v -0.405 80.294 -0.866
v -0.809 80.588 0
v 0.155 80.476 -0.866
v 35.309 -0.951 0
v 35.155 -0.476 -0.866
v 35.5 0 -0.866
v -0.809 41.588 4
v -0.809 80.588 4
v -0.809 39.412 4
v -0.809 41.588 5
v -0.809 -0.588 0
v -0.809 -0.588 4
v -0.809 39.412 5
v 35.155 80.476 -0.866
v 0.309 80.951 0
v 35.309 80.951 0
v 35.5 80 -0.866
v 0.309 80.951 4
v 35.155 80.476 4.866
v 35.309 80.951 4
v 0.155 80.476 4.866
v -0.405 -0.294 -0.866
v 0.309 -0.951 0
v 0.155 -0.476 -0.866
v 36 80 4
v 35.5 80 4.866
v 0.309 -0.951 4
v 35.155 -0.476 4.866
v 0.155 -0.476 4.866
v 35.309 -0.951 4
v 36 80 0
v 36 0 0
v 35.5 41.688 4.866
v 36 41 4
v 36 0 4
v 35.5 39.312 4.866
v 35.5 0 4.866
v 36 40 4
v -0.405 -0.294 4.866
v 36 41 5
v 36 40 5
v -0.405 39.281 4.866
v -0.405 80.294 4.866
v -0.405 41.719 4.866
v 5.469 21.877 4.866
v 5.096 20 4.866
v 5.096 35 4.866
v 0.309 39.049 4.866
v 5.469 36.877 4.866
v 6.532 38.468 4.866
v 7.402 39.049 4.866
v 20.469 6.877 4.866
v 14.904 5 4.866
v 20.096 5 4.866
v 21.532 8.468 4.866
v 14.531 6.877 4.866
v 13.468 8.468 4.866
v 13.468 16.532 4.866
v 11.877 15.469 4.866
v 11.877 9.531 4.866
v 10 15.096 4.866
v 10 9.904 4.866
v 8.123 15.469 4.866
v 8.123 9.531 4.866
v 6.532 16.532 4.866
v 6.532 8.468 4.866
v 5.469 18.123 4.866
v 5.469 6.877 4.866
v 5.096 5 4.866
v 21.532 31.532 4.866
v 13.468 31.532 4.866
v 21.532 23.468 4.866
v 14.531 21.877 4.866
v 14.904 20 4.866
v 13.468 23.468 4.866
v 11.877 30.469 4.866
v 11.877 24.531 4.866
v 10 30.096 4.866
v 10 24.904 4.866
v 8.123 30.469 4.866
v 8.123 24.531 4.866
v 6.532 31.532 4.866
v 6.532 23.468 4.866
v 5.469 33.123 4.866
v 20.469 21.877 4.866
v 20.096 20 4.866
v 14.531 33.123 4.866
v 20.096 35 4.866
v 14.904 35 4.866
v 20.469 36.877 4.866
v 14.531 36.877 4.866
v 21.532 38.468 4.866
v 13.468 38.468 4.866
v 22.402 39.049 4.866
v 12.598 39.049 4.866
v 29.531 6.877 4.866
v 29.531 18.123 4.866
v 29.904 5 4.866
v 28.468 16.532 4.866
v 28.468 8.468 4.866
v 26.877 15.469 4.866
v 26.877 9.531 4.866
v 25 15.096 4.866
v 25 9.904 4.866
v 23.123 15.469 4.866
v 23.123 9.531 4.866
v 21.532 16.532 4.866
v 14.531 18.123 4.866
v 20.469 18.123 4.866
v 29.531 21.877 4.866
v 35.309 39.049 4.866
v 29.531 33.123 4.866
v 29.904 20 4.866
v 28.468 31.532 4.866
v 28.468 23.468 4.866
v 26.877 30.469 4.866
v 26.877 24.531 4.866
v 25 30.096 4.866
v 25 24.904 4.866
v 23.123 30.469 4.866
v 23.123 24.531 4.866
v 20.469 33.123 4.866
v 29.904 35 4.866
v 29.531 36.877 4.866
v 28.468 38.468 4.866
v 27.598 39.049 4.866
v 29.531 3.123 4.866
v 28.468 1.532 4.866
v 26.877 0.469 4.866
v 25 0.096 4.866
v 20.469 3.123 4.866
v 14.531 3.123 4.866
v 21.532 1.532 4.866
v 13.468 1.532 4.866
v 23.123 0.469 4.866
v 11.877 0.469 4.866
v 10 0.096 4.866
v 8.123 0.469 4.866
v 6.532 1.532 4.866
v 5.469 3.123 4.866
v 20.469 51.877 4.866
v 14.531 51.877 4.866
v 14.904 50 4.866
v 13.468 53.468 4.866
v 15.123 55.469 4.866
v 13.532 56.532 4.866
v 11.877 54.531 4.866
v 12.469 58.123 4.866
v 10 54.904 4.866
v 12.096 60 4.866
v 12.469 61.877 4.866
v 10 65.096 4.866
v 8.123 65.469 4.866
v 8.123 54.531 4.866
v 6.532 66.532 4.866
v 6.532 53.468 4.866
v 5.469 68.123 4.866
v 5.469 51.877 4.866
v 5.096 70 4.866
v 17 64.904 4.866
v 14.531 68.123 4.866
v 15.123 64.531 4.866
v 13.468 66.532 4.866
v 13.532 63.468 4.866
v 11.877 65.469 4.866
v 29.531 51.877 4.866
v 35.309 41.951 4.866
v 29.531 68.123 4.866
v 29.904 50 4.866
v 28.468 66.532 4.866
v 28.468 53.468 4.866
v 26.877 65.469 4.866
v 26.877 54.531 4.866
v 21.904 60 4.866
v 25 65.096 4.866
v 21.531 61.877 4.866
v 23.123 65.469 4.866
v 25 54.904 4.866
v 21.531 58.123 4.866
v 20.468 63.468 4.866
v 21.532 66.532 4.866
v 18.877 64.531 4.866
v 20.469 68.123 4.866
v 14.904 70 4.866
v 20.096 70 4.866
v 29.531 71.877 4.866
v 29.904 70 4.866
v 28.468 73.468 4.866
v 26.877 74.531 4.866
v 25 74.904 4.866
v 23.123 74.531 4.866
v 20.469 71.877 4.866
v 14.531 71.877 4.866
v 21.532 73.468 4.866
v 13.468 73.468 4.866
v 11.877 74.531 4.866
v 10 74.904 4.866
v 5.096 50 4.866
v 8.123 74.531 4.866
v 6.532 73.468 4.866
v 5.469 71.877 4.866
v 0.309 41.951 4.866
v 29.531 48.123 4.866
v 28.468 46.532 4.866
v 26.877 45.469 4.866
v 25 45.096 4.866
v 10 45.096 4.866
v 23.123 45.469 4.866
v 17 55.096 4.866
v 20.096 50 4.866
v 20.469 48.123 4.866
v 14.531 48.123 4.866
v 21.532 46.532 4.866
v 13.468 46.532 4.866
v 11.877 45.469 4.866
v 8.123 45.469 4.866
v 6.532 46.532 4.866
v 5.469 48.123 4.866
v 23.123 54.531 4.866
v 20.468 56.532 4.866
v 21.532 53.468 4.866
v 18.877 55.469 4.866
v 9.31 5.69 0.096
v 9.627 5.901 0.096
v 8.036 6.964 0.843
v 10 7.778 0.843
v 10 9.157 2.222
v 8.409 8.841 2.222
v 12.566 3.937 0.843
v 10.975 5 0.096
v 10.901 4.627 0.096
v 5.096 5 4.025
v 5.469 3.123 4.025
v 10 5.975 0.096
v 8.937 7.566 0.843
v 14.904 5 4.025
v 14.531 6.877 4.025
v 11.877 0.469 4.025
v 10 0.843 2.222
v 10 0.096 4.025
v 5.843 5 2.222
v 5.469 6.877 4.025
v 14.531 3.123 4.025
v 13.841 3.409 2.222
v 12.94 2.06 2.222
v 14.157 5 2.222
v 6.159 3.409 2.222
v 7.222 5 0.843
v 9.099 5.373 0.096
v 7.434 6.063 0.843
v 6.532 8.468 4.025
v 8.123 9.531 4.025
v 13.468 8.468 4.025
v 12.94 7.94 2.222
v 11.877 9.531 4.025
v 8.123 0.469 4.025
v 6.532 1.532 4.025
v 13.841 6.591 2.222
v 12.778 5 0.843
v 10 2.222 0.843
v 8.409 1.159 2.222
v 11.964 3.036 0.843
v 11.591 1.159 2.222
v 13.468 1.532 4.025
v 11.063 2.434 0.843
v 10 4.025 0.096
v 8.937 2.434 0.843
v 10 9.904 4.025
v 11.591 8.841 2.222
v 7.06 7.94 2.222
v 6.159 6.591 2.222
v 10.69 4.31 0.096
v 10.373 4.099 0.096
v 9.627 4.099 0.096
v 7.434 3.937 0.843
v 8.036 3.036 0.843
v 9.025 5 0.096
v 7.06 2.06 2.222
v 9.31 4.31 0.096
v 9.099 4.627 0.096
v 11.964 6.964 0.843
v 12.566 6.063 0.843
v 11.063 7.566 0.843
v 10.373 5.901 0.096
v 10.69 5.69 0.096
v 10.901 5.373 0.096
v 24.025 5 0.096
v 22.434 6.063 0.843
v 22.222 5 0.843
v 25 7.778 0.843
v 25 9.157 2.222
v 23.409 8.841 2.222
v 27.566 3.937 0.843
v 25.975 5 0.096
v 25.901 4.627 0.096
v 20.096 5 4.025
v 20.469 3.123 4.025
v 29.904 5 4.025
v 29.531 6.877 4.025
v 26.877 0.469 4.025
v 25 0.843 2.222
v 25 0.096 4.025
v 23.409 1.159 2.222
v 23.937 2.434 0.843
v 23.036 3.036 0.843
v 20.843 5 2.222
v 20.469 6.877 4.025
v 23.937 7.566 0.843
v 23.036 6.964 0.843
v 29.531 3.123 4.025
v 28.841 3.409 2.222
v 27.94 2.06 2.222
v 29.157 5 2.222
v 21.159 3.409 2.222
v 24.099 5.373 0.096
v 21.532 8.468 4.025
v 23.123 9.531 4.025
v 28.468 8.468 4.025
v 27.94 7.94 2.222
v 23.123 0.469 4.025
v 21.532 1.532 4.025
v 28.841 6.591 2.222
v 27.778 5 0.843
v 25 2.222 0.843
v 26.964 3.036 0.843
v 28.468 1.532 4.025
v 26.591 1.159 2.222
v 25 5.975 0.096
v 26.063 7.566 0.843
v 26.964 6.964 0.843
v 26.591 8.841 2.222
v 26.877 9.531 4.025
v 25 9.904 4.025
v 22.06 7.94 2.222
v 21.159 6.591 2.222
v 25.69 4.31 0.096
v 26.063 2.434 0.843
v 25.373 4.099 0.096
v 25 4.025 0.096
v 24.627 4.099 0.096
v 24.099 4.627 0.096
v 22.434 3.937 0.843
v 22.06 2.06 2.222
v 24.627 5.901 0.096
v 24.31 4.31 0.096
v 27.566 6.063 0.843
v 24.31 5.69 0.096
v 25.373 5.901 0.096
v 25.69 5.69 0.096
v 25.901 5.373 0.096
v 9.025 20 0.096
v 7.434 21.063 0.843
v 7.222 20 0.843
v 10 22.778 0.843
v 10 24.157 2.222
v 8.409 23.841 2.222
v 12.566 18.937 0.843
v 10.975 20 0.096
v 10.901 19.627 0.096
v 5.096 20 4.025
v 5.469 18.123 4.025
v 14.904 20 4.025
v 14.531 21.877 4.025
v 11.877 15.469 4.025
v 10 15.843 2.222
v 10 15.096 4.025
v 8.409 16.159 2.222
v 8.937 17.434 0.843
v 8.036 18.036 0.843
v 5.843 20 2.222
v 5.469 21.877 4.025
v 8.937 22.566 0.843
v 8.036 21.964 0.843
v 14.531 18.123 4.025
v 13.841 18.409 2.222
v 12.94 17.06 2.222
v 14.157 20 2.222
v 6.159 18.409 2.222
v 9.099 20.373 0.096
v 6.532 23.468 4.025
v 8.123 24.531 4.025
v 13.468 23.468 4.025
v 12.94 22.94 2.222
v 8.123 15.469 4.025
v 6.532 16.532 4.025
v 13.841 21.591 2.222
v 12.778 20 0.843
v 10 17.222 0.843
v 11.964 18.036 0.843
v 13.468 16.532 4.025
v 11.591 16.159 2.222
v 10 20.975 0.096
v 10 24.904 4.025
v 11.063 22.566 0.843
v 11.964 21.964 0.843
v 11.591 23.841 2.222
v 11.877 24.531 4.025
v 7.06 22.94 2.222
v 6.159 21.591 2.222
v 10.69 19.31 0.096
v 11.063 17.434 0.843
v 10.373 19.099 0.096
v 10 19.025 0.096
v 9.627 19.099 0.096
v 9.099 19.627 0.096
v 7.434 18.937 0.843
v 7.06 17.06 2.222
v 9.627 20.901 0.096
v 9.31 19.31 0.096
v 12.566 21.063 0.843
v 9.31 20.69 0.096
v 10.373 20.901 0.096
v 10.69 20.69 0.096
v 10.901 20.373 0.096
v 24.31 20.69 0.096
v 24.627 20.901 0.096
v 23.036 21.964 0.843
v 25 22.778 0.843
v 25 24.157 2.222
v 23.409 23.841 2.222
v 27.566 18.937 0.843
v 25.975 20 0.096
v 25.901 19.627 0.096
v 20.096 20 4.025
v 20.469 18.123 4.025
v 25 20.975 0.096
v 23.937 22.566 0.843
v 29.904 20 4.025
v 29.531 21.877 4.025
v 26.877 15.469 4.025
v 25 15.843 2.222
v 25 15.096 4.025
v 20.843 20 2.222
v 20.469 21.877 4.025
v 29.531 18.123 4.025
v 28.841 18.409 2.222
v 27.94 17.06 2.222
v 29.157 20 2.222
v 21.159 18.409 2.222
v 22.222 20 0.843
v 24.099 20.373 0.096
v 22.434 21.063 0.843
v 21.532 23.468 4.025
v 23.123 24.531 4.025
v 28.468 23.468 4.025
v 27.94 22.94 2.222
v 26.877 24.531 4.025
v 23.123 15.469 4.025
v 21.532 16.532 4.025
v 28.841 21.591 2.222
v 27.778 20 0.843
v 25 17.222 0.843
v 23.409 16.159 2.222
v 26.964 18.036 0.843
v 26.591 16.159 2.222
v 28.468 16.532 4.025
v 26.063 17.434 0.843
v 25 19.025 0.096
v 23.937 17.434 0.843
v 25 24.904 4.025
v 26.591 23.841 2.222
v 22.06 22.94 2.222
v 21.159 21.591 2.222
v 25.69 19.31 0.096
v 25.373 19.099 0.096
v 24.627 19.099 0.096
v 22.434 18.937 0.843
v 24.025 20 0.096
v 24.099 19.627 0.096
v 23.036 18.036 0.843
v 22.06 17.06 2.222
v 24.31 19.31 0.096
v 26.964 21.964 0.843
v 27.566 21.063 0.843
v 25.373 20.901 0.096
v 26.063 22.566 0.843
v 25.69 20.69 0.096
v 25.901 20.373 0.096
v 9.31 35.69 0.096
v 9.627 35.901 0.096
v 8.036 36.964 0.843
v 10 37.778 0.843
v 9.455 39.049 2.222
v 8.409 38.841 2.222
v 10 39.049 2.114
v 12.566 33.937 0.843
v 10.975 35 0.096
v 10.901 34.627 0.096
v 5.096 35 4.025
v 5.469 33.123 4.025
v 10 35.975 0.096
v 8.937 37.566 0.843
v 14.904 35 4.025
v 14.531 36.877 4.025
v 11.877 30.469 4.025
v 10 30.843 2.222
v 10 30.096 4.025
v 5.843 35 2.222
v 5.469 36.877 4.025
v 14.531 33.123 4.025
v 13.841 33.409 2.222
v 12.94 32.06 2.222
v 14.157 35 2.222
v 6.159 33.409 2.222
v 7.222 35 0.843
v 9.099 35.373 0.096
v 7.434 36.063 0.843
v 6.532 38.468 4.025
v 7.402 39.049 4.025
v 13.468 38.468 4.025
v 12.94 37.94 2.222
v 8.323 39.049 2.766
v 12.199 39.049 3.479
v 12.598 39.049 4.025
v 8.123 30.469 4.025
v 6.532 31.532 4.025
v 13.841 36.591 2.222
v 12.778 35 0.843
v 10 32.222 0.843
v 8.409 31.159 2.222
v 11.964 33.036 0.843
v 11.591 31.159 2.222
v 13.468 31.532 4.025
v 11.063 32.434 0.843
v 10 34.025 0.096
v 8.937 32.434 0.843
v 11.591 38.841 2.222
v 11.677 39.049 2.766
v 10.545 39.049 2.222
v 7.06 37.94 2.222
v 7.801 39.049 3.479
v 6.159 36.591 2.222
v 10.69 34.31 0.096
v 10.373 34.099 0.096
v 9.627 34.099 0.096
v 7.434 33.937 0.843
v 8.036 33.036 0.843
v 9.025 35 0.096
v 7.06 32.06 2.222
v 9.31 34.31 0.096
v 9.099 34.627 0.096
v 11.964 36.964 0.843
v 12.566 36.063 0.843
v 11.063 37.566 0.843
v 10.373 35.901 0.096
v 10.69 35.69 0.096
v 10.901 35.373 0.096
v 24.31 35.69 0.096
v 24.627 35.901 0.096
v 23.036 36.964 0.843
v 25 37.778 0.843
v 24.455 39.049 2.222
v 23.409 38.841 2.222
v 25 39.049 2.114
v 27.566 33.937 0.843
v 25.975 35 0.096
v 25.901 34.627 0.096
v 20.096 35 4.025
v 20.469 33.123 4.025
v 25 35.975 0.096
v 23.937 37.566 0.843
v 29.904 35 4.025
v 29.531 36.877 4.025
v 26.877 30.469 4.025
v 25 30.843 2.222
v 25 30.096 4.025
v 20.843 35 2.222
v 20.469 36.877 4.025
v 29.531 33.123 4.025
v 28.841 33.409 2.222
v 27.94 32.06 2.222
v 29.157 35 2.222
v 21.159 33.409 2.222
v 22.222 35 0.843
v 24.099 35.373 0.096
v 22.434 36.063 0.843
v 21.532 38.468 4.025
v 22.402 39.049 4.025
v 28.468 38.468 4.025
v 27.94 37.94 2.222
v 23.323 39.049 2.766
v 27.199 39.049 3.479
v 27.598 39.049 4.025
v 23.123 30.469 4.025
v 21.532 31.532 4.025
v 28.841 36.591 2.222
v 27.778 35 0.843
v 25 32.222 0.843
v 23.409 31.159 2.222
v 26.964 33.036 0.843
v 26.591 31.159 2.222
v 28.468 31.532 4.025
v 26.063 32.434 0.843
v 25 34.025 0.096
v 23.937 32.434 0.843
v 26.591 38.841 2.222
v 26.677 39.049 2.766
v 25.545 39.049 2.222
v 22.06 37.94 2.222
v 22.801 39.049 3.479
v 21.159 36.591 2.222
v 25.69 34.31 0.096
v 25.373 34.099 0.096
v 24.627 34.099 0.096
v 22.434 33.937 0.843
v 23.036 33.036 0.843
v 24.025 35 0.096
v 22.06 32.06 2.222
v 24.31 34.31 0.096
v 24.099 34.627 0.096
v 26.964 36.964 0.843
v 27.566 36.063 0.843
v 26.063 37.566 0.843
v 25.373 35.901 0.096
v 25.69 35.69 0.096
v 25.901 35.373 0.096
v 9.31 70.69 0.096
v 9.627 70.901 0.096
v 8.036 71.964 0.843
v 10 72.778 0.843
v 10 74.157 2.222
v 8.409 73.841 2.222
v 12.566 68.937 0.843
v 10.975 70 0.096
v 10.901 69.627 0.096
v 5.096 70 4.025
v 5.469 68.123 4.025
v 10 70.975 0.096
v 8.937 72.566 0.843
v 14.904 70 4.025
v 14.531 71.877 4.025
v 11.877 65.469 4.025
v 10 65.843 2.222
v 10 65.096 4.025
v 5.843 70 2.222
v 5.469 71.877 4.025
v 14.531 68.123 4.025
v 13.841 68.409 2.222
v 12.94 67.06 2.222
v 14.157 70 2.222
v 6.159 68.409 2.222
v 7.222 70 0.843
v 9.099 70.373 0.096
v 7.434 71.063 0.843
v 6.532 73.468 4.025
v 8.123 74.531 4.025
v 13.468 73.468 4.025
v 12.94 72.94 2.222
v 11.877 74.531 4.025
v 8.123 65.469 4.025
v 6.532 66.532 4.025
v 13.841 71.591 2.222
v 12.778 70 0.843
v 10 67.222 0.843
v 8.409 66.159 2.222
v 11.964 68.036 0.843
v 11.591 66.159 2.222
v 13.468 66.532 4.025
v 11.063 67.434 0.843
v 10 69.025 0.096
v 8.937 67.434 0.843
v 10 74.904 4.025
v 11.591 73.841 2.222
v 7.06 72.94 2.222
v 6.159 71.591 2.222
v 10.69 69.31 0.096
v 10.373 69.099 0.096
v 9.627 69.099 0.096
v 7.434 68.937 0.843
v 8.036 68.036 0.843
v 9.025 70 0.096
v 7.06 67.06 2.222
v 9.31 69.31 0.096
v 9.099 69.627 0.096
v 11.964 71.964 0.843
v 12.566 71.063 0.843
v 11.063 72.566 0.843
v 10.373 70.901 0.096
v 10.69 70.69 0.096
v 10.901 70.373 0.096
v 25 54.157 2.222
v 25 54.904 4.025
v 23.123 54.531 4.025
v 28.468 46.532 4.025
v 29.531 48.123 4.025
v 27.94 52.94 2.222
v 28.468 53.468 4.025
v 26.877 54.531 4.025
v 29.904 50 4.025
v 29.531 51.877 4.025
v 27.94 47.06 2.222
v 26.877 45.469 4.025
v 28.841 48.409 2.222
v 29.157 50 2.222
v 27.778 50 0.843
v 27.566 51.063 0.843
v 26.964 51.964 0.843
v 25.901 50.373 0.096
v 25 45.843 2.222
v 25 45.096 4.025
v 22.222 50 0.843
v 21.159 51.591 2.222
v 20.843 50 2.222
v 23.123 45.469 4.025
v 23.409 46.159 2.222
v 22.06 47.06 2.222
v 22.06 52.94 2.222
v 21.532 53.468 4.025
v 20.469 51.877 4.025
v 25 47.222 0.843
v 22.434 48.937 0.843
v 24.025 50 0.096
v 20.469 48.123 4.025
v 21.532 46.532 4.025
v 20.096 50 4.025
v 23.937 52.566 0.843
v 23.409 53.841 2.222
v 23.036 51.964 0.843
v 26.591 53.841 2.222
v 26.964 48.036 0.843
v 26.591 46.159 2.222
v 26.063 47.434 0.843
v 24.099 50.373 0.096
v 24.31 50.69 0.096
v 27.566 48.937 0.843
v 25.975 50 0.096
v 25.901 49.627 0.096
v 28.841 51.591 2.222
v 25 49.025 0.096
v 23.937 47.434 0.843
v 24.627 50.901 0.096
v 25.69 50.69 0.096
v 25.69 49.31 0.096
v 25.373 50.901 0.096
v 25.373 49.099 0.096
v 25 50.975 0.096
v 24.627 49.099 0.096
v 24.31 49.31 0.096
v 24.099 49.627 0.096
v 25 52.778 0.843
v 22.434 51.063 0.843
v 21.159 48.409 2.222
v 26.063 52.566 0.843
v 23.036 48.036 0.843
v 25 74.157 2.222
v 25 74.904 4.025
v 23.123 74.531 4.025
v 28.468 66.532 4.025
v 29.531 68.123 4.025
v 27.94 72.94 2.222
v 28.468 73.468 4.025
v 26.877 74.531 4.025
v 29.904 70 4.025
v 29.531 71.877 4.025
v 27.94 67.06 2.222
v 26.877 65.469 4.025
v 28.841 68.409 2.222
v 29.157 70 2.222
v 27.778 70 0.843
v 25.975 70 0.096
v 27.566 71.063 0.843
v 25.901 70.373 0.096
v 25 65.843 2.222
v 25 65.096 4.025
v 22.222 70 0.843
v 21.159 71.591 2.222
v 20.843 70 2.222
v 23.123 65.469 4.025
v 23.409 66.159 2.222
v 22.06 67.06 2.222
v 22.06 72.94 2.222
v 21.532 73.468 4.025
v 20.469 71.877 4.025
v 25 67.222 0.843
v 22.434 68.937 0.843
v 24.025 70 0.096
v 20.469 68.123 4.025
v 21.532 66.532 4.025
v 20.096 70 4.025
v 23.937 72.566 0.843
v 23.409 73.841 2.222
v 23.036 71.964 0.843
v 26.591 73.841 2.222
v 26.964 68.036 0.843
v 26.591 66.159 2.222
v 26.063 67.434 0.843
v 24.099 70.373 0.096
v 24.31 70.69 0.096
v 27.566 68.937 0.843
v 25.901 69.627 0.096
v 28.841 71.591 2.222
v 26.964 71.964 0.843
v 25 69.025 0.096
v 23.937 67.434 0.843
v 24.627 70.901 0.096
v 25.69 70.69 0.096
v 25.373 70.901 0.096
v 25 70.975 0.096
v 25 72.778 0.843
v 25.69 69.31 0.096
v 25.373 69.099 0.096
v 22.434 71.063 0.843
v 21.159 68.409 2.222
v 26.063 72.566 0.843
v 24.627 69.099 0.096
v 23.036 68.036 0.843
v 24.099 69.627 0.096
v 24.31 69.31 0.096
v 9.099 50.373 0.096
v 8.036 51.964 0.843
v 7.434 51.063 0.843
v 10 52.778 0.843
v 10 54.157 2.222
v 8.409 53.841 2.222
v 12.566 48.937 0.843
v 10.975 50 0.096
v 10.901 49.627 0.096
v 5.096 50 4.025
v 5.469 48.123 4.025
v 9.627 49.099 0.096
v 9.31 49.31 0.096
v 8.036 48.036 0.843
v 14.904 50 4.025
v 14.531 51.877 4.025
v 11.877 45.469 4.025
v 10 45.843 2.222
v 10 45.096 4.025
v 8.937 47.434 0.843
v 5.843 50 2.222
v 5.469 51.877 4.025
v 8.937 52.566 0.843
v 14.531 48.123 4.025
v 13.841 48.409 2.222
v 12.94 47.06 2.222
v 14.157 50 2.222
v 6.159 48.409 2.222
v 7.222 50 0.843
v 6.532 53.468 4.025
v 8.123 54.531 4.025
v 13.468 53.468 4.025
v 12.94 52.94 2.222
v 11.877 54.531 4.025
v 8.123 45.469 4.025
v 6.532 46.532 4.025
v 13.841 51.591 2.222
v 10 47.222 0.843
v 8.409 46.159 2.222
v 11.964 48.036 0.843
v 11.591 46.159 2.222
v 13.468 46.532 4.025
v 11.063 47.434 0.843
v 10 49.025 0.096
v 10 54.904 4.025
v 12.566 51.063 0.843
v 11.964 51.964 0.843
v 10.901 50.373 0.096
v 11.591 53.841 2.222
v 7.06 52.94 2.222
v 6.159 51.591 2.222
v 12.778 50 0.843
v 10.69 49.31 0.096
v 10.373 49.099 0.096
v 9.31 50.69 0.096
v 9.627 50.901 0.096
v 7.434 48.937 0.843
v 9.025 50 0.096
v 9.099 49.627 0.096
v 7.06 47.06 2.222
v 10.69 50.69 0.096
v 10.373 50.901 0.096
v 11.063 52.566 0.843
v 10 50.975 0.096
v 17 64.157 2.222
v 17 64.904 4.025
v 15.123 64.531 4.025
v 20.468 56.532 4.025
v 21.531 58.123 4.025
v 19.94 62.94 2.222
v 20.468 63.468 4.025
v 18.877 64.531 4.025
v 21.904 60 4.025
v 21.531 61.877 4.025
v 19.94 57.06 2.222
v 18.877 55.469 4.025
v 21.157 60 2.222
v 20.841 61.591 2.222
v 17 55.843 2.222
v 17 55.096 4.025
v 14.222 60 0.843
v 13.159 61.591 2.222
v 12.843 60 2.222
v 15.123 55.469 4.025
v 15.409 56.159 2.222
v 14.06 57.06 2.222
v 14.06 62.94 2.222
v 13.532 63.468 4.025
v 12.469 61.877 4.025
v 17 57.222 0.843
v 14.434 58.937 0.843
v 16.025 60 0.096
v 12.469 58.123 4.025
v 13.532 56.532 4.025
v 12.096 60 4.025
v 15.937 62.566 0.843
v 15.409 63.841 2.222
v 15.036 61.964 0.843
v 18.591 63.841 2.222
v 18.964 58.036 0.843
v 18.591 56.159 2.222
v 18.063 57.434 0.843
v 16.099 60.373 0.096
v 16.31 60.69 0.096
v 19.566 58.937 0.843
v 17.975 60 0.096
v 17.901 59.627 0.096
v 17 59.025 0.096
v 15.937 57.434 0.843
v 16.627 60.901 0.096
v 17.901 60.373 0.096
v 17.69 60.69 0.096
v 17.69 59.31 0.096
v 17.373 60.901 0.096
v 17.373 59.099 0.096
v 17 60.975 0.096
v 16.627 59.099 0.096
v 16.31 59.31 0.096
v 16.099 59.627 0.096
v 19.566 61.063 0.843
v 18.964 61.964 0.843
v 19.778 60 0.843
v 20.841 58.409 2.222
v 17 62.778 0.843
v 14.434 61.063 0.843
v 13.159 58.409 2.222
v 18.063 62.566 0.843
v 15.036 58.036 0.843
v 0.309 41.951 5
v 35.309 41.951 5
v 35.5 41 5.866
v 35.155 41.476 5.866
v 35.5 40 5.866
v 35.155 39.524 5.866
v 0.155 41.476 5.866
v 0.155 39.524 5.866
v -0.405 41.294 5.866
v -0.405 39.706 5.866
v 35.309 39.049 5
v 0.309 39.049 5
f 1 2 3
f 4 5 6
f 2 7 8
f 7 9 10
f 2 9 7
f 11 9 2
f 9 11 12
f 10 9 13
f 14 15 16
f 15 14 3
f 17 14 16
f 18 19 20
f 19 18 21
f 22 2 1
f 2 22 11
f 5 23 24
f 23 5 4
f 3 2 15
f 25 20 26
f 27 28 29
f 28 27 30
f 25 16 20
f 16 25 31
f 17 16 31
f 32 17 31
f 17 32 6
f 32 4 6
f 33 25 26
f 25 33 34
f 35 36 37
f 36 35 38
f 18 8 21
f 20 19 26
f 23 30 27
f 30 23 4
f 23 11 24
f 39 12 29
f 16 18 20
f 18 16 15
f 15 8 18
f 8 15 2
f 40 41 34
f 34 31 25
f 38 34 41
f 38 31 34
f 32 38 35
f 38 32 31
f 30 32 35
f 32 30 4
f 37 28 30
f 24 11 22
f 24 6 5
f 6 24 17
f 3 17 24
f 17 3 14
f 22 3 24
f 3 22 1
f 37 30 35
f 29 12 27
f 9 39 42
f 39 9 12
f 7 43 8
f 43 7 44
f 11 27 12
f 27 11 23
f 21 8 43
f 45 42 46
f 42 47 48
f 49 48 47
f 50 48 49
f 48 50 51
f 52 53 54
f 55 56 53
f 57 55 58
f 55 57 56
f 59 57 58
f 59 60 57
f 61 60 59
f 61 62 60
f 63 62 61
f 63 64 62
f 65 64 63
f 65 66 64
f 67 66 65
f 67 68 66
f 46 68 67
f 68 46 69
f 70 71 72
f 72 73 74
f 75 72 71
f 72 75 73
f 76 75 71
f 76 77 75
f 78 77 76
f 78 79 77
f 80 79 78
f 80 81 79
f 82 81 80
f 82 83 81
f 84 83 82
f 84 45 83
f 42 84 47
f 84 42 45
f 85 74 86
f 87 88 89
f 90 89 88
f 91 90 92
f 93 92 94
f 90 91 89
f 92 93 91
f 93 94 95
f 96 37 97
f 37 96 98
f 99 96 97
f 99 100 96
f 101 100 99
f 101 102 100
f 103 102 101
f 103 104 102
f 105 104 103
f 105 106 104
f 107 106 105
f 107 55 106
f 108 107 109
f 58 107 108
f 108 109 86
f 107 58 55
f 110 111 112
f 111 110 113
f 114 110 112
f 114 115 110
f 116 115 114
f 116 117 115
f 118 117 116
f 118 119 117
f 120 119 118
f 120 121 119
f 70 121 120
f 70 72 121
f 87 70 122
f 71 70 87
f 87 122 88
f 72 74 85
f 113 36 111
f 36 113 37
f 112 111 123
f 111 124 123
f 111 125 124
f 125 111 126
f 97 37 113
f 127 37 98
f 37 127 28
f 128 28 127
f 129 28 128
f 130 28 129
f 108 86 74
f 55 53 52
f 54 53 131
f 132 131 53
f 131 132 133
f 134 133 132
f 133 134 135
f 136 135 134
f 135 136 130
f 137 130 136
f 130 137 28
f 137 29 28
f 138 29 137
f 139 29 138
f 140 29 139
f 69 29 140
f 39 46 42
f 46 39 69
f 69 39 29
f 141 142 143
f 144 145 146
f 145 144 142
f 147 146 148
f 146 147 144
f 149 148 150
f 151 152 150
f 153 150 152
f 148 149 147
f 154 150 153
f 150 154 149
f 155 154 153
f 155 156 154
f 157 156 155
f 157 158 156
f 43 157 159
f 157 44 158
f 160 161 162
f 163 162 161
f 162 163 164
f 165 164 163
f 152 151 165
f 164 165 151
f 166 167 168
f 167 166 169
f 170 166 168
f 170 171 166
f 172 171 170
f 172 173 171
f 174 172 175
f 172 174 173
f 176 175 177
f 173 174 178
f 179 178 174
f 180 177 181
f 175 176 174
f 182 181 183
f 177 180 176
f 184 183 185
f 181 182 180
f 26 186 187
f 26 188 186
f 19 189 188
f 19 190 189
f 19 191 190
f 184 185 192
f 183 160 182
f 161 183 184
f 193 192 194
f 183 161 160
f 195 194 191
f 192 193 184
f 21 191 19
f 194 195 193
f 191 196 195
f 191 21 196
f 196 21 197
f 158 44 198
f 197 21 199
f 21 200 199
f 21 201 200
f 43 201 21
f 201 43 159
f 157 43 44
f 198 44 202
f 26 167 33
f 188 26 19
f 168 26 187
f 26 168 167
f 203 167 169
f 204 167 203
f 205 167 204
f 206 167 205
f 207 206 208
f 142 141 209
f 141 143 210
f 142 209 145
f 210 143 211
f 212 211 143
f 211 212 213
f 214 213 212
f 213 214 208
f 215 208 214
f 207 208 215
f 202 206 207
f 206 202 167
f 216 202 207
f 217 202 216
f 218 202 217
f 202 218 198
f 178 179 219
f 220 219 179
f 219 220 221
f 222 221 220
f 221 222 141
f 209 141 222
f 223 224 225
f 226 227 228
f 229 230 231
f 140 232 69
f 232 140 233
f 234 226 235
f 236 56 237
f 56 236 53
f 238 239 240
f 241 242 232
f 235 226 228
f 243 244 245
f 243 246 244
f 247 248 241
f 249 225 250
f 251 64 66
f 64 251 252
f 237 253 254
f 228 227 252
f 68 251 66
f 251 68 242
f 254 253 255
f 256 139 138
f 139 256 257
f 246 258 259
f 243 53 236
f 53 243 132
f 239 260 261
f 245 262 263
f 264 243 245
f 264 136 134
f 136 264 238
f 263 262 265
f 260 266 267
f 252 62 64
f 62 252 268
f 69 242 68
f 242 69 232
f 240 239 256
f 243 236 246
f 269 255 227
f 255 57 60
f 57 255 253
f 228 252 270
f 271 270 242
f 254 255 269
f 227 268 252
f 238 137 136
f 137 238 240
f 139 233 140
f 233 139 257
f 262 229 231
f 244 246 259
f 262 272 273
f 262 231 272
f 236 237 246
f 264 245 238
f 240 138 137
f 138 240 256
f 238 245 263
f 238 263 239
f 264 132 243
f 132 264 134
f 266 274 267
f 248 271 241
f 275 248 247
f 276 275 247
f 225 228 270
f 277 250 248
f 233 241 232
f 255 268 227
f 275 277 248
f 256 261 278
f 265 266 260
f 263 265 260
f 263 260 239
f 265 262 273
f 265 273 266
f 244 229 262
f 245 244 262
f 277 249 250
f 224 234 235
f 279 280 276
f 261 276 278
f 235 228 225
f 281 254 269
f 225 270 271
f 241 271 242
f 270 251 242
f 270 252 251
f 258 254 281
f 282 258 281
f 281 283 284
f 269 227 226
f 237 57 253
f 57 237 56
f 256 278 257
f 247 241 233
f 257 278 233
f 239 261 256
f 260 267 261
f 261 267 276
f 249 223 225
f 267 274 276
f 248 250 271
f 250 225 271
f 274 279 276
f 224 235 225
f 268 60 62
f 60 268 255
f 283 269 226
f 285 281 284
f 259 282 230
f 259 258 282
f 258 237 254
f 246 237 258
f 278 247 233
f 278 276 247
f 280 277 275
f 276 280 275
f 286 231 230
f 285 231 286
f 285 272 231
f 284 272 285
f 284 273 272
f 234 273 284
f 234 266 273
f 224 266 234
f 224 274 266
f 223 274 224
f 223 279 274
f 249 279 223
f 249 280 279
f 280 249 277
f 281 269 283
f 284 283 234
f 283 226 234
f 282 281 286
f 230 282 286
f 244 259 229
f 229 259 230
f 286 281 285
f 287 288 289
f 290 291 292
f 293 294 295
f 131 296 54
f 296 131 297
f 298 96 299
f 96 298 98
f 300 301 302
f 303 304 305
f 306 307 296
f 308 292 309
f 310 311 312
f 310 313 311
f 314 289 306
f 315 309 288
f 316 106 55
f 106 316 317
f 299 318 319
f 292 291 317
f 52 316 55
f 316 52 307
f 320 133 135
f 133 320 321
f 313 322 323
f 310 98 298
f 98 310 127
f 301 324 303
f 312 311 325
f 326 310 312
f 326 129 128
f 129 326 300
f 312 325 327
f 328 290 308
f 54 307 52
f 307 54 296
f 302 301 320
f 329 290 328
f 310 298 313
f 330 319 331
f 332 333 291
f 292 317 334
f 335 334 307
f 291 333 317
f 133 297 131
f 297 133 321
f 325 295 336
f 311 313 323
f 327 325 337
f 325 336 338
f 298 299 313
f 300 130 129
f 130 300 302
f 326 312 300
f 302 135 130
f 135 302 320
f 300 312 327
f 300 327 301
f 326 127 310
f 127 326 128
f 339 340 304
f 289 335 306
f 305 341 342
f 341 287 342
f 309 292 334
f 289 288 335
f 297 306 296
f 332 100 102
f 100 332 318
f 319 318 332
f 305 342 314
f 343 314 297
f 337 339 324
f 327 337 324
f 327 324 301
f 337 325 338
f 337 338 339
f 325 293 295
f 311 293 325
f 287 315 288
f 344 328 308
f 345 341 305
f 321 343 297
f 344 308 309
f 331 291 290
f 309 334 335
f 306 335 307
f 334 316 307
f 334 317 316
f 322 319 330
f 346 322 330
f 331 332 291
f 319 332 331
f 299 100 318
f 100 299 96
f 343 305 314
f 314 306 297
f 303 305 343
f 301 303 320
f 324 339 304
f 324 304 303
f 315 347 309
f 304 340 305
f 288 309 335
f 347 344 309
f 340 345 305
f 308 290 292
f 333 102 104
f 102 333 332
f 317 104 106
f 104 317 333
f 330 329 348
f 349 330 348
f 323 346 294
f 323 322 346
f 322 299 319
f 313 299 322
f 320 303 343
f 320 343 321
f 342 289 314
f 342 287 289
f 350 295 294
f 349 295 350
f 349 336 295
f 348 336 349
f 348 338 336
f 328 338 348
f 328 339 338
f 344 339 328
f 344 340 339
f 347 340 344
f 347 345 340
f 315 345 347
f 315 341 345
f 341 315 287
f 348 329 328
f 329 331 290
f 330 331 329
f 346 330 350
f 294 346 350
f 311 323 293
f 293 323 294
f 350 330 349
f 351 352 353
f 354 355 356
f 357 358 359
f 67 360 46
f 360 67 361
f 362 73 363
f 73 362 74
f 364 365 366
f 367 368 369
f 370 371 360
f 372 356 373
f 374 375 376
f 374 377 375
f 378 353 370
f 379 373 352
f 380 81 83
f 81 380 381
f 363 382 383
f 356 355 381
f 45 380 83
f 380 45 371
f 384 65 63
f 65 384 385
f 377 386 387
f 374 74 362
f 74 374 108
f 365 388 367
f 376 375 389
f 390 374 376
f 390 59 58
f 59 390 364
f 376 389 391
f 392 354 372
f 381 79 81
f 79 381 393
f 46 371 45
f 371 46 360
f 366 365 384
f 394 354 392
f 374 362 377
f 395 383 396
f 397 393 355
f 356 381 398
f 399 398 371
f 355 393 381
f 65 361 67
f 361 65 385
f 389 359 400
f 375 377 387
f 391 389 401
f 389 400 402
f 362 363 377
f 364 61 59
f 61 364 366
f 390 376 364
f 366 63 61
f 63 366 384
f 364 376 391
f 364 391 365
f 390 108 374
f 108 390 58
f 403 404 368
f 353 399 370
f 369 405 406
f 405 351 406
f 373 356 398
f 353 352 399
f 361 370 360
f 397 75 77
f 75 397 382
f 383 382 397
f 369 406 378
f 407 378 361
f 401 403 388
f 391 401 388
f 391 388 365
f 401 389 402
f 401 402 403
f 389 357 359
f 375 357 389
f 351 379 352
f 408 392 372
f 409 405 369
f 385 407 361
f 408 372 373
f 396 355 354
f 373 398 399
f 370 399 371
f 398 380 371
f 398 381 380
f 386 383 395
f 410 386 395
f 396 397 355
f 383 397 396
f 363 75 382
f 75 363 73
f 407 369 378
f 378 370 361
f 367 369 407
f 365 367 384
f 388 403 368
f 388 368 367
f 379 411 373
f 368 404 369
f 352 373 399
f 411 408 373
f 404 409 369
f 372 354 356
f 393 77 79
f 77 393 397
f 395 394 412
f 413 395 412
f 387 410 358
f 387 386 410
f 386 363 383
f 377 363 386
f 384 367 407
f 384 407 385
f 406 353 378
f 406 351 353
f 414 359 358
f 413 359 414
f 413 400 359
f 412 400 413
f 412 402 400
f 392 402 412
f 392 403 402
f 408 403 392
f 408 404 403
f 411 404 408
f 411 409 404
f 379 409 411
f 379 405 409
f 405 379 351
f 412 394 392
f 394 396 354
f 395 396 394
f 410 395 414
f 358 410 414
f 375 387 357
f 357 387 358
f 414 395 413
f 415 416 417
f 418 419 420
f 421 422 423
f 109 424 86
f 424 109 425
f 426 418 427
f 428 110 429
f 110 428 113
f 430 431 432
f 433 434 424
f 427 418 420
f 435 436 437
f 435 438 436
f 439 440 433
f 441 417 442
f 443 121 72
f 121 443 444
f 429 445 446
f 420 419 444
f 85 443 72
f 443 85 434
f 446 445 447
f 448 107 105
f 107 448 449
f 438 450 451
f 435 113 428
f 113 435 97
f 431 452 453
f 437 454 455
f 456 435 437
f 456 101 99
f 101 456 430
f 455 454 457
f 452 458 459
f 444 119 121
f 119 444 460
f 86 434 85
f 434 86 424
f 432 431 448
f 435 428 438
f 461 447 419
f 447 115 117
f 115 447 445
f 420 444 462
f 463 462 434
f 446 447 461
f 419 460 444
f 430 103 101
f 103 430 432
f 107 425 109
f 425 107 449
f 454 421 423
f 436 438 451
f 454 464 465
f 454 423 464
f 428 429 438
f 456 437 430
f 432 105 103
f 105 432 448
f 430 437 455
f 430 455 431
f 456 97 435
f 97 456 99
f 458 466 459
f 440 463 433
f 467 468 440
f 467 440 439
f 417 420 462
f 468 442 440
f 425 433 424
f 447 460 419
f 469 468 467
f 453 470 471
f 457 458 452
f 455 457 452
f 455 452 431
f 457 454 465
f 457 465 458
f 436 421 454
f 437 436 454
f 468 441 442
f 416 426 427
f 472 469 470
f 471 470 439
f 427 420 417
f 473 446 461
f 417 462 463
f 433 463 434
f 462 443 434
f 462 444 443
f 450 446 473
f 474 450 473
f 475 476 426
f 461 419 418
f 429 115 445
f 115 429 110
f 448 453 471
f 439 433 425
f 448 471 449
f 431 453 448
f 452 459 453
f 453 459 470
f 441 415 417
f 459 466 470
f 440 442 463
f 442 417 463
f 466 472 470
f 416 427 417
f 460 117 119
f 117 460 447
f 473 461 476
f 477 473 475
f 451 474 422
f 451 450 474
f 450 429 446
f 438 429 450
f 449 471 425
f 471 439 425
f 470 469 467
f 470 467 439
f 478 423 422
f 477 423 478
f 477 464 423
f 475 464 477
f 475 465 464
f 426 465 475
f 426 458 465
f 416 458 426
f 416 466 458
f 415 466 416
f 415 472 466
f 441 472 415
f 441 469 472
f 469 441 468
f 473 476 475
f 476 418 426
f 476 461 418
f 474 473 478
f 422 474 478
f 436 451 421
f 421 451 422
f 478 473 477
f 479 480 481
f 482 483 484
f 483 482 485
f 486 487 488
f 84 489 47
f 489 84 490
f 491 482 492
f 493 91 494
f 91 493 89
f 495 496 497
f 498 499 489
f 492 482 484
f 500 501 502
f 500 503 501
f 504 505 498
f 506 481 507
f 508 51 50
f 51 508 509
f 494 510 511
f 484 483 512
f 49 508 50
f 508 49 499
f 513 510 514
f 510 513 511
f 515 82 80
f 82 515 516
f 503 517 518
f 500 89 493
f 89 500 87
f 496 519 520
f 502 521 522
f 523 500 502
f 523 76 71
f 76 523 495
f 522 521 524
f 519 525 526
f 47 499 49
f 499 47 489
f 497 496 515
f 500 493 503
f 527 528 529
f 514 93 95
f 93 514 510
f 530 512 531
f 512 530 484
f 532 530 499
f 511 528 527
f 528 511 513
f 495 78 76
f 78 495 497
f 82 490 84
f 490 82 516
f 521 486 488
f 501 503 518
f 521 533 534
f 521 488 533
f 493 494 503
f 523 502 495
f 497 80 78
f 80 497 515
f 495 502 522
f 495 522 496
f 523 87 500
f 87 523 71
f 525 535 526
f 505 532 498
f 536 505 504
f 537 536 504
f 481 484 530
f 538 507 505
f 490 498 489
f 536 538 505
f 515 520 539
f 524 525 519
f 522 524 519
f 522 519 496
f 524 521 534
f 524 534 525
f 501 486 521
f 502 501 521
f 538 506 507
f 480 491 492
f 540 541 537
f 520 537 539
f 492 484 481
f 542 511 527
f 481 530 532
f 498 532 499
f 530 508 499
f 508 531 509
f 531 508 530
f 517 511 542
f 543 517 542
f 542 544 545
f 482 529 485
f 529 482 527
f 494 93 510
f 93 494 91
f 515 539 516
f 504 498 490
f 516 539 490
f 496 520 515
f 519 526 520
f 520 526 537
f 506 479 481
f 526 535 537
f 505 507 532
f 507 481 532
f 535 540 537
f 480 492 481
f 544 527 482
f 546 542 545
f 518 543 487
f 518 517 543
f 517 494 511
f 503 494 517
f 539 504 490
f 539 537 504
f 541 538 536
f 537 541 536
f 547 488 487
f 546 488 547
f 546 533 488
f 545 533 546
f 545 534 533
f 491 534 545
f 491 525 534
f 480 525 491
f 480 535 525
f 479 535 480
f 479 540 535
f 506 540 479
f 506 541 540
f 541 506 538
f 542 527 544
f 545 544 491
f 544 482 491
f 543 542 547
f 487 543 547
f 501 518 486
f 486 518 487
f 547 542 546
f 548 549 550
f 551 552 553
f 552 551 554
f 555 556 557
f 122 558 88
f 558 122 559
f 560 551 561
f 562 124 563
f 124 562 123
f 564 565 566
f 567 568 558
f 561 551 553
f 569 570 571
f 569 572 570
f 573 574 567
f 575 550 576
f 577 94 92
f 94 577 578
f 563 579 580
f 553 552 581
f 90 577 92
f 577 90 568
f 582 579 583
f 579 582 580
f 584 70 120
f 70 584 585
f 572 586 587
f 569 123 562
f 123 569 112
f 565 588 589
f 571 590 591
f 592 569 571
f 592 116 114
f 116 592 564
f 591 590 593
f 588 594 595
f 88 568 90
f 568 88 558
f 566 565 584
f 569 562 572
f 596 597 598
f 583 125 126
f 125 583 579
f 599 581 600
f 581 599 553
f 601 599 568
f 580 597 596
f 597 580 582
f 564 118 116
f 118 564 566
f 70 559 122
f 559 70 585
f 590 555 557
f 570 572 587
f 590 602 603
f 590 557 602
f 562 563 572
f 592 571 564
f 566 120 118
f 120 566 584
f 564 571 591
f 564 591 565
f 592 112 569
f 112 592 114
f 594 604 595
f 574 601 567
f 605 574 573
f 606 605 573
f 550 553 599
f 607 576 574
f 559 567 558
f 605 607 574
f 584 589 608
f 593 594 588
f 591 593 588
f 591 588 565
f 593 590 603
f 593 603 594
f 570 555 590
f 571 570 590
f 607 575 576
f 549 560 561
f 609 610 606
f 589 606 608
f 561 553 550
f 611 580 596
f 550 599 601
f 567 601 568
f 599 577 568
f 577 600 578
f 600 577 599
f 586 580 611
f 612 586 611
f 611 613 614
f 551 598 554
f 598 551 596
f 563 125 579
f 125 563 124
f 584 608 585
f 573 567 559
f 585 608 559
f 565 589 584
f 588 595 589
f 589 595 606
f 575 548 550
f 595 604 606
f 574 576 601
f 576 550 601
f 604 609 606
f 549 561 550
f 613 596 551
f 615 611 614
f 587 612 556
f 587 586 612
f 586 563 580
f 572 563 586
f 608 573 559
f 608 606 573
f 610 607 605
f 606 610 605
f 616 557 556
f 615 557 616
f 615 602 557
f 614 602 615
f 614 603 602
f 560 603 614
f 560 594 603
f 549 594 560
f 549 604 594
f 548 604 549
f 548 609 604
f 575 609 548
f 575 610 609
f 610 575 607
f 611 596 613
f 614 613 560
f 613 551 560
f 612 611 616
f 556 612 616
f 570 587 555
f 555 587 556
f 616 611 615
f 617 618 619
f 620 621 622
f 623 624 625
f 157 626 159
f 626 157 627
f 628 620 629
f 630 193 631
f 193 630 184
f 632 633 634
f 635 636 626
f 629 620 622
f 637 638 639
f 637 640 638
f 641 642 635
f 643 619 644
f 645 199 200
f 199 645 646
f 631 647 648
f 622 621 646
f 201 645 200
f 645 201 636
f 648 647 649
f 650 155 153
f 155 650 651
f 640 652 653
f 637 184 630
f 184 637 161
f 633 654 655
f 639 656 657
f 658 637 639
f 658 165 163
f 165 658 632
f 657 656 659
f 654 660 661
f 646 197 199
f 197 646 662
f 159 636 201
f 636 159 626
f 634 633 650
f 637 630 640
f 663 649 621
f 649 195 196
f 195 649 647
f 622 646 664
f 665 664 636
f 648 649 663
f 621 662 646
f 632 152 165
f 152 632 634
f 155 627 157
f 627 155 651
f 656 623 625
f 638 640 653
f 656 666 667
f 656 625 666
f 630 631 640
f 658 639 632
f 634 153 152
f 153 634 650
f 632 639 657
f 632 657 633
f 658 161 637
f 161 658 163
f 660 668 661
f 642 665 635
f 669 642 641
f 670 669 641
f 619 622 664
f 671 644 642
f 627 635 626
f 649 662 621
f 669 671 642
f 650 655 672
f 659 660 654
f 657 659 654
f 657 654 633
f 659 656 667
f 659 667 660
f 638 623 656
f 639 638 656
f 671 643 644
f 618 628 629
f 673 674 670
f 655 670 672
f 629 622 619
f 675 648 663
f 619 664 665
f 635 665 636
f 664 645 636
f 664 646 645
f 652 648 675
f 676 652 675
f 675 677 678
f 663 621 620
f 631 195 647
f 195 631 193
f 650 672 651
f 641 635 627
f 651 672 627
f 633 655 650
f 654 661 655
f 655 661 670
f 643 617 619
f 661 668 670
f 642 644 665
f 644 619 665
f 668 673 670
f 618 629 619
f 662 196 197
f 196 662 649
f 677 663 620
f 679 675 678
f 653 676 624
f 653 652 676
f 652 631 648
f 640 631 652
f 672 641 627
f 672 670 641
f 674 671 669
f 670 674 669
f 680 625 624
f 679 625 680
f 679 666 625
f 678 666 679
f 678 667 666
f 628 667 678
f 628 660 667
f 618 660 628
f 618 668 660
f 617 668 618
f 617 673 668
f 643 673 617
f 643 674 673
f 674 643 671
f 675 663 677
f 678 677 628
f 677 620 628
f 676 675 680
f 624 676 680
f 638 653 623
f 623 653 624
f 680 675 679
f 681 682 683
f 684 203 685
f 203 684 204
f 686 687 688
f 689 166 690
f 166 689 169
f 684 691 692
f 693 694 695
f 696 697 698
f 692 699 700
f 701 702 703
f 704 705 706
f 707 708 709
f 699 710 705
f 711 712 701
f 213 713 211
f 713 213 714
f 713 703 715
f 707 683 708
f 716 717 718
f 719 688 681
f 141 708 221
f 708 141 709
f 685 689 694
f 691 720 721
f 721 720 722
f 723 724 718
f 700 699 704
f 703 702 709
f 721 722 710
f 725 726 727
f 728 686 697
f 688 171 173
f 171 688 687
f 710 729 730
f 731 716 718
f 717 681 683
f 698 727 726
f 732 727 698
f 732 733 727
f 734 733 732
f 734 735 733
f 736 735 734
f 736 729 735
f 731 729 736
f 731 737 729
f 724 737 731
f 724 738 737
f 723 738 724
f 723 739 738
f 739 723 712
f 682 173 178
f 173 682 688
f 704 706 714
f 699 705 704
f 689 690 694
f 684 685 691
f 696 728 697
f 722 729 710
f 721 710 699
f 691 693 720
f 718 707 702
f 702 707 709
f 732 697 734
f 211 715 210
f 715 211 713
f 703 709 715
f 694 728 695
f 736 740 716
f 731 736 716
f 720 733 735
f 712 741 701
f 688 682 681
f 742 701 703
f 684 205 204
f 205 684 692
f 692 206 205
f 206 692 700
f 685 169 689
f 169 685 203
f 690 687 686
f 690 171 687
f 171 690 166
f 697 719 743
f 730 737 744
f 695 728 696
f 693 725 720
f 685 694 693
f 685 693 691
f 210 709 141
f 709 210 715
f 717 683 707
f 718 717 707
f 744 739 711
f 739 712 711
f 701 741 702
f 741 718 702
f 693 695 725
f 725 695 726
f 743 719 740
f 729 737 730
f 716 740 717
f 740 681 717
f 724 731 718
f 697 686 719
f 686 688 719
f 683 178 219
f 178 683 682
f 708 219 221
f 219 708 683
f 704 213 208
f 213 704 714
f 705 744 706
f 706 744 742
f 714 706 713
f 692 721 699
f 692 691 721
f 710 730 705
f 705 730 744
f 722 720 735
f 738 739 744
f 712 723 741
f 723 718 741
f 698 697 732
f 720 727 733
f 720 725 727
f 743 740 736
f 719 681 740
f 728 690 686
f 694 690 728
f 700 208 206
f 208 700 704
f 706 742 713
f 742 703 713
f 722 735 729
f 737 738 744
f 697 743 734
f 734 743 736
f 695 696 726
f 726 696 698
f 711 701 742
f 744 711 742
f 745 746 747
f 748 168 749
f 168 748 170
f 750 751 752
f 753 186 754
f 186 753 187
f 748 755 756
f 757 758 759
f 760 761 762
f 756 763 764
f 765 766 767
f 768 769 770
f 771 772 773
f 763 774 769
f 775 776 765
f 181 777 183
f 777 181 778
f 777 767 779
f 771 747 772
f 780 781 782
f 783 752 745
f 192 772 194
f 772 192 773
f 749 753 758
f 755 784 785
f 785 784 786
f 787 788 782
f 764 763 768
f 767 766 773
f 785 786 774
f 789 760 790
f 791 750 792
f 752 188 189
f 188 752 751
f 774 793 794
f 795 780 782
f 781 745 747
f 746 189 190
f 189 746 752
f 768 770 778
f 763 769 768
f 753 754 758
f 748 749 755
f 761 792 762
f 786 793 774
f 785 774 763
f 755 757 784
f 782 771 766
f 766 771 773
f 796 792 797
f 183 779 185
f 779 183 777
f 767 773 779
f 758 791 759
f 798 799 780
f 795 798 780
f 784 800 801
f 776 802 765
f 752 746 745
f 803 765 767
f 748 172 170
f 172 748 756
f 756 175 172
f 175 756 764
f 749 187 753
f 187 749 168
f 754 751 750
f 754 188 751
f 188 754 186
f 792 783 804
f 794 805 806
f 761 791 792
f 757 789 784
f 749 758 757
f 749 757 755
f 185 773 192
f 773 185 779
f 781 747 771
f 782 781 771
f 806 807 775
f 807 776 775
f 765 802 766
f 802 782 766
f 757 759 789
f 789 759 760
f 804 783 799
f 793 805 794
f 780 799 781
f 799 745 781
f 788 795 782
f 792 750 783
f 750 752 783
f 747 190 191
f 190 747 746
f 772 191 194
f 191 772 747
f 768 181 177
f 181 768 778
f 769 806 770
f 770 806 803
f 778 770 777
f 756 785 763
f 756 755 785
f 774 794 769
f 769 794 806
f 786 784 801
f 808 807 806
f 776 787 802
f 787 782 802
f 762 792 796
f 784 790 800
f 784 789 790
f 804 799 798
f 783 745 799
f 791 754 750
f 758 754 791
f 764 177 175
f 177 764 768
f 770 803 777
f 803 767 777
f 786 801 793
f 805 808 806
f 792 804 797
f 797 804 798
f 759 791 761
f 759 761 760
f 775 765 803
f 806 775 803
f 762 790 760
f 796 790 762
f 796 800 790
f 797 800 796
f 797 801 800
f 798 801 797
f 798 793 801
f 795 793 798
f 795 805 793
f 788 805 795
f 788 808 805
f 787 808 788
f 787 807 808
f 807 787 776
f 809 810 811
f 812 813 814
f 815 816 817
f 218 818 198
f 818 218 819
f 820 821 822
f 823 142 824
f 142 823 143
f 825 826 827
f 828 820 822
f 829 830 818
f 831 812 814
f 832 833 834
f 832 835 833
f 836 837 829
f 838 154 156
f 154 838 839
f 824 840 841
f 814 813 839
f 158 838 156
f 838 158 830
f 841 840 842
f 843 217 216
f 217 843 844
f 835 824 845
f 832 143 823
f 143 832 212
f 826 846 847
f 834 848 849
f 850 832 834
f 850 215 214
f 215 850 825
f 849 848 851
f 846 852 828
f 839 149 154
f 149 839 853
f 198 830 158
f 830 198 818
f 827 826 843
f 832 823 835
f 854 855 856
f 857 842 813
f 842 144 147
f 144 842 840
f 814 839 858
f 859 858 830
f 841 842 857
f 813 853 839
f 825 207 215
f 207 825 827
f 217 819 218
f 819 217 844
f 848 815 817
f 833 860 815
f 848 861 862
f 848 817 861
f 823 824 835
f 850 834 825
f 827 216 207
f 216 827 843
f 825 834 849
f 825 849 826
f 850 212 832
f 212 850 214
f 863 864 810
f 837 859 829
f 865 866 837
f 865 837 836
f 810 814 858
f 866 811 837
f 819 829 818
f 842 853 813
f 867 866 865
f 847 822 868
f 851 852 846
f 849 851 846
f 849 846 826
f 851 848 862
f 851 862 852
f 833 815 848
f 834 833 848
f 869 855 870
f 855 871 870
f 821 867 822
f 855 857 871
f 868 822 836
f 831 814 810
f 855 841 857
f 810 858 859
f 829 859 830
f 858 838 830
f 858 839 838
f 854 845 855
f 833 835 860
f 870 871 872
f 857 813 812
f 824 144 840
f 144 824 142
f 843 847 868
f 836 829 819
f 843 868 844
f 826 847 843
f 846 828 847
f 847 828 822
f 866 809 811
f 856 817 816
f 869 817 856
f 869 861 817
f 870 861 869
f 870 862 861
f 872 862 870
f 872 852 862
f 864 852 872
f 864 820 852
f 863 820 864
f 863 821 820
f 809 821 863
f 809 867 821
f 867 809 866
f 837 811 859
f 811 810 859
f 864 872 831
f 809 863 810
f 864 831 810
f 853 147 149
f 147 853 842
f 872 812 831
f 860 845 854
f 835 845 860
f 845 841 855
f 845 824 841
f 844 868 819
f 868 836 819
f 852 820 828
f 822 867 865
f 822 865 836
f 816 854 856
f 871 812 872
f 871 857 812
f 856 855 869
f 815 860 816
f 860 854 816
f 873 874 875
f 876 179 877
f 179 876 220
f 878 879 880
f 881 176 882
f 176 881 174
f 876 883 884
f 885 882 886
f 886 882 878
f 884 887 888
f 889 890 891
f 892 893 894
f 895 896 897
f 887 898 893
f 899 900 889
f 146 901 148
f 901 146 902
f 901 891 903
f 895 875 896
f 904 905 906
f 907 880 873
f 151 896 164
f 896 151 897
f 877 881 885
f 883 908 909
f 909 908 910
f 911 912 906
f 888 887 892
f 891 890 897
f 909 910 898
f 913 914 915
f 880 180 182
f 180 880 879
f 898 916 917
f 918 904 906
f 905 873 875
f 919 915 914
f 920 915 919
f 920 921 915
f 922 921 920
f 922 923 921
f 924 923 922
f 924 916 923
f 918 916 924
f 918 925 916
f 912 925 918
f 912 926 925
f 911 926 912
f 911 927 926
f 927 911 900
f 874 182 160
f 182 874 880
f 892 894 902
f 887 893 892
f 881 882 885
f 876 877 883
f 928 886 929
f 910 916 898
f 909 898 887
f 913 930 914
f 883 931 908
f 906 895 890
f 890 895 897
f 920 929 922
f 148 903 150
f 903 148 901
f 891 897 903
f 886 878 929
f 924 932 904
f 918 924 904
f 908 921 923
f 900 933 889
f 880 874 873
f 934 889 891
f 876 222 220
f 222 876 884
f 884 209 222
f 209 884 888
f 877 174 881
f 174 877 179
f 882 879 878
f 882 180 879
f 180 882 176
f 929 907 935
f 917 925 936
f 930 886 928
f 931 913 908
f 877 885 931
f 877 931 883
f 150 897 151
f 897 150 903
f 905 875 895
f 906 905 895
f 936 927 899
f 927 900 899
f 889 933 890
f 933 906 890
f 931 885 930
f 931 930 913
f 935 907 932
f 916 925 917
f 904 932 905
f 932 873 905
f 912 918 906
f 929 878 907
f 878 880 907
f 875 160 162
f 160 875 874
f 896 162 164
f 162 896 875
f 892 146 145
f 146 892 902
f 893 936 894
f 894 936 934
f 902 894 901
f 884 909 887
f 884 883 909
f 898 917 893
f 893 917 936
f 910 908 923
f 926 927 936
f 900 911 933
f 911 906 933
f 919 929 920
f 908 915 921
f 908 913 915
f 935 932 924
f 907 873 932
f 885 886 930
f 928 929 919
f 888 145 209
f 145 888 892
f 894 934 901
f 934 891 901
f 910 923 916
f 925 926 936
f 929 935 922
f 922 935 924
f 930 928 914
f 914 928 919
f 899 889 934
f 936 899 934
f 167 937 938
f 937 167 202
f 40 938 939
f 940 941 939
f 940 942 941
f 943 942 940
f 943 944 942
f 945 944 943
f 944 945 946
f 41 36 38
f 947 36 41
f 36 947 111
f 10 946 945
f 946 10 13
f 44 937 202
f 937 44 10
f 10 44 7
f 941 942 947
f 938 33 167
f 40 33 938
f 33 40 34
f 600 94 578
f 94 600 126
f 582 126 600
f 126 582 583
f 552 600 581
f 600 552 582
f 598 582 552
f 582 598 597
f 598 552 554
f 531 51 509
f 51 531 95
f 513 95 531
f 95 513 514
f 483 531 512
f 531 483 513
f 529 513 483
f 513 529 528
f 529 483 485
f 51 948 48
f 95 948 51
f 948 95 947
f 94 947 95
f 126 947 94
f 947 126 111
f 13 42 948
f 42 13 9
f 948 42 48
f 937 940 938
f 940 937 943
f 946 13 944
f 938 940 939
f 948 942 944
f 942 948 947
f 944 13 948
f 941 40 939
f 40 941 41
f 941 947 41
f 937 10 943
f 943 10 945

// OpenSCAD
// Loguncov Maxim 13.12.13


//$fn=128;


translate([0,40,0])
minkowski()
{cube([35,1,5]);
sphere(1);
}

difference() {

//основа
minkowski()
{cube([35,80,4]);
sphere(1);
}

//отверстия
translate([10,5,5])sphere(5);
translate([25,5,5])sphere(5);
translate([10,20,5])sphere(5);
translate([25,20,5])sphere(5);
translate([10,35,5])sphere(5);
translate([25,35,5])sphere(5);

translate([10,70,5])sphere(5);
translate([25,50,5])sphere(5);
translate([25,70,5])sphere(5);
translate([10,50,5])sphere(5);
translate([17,60,5])sphere(5);
}
